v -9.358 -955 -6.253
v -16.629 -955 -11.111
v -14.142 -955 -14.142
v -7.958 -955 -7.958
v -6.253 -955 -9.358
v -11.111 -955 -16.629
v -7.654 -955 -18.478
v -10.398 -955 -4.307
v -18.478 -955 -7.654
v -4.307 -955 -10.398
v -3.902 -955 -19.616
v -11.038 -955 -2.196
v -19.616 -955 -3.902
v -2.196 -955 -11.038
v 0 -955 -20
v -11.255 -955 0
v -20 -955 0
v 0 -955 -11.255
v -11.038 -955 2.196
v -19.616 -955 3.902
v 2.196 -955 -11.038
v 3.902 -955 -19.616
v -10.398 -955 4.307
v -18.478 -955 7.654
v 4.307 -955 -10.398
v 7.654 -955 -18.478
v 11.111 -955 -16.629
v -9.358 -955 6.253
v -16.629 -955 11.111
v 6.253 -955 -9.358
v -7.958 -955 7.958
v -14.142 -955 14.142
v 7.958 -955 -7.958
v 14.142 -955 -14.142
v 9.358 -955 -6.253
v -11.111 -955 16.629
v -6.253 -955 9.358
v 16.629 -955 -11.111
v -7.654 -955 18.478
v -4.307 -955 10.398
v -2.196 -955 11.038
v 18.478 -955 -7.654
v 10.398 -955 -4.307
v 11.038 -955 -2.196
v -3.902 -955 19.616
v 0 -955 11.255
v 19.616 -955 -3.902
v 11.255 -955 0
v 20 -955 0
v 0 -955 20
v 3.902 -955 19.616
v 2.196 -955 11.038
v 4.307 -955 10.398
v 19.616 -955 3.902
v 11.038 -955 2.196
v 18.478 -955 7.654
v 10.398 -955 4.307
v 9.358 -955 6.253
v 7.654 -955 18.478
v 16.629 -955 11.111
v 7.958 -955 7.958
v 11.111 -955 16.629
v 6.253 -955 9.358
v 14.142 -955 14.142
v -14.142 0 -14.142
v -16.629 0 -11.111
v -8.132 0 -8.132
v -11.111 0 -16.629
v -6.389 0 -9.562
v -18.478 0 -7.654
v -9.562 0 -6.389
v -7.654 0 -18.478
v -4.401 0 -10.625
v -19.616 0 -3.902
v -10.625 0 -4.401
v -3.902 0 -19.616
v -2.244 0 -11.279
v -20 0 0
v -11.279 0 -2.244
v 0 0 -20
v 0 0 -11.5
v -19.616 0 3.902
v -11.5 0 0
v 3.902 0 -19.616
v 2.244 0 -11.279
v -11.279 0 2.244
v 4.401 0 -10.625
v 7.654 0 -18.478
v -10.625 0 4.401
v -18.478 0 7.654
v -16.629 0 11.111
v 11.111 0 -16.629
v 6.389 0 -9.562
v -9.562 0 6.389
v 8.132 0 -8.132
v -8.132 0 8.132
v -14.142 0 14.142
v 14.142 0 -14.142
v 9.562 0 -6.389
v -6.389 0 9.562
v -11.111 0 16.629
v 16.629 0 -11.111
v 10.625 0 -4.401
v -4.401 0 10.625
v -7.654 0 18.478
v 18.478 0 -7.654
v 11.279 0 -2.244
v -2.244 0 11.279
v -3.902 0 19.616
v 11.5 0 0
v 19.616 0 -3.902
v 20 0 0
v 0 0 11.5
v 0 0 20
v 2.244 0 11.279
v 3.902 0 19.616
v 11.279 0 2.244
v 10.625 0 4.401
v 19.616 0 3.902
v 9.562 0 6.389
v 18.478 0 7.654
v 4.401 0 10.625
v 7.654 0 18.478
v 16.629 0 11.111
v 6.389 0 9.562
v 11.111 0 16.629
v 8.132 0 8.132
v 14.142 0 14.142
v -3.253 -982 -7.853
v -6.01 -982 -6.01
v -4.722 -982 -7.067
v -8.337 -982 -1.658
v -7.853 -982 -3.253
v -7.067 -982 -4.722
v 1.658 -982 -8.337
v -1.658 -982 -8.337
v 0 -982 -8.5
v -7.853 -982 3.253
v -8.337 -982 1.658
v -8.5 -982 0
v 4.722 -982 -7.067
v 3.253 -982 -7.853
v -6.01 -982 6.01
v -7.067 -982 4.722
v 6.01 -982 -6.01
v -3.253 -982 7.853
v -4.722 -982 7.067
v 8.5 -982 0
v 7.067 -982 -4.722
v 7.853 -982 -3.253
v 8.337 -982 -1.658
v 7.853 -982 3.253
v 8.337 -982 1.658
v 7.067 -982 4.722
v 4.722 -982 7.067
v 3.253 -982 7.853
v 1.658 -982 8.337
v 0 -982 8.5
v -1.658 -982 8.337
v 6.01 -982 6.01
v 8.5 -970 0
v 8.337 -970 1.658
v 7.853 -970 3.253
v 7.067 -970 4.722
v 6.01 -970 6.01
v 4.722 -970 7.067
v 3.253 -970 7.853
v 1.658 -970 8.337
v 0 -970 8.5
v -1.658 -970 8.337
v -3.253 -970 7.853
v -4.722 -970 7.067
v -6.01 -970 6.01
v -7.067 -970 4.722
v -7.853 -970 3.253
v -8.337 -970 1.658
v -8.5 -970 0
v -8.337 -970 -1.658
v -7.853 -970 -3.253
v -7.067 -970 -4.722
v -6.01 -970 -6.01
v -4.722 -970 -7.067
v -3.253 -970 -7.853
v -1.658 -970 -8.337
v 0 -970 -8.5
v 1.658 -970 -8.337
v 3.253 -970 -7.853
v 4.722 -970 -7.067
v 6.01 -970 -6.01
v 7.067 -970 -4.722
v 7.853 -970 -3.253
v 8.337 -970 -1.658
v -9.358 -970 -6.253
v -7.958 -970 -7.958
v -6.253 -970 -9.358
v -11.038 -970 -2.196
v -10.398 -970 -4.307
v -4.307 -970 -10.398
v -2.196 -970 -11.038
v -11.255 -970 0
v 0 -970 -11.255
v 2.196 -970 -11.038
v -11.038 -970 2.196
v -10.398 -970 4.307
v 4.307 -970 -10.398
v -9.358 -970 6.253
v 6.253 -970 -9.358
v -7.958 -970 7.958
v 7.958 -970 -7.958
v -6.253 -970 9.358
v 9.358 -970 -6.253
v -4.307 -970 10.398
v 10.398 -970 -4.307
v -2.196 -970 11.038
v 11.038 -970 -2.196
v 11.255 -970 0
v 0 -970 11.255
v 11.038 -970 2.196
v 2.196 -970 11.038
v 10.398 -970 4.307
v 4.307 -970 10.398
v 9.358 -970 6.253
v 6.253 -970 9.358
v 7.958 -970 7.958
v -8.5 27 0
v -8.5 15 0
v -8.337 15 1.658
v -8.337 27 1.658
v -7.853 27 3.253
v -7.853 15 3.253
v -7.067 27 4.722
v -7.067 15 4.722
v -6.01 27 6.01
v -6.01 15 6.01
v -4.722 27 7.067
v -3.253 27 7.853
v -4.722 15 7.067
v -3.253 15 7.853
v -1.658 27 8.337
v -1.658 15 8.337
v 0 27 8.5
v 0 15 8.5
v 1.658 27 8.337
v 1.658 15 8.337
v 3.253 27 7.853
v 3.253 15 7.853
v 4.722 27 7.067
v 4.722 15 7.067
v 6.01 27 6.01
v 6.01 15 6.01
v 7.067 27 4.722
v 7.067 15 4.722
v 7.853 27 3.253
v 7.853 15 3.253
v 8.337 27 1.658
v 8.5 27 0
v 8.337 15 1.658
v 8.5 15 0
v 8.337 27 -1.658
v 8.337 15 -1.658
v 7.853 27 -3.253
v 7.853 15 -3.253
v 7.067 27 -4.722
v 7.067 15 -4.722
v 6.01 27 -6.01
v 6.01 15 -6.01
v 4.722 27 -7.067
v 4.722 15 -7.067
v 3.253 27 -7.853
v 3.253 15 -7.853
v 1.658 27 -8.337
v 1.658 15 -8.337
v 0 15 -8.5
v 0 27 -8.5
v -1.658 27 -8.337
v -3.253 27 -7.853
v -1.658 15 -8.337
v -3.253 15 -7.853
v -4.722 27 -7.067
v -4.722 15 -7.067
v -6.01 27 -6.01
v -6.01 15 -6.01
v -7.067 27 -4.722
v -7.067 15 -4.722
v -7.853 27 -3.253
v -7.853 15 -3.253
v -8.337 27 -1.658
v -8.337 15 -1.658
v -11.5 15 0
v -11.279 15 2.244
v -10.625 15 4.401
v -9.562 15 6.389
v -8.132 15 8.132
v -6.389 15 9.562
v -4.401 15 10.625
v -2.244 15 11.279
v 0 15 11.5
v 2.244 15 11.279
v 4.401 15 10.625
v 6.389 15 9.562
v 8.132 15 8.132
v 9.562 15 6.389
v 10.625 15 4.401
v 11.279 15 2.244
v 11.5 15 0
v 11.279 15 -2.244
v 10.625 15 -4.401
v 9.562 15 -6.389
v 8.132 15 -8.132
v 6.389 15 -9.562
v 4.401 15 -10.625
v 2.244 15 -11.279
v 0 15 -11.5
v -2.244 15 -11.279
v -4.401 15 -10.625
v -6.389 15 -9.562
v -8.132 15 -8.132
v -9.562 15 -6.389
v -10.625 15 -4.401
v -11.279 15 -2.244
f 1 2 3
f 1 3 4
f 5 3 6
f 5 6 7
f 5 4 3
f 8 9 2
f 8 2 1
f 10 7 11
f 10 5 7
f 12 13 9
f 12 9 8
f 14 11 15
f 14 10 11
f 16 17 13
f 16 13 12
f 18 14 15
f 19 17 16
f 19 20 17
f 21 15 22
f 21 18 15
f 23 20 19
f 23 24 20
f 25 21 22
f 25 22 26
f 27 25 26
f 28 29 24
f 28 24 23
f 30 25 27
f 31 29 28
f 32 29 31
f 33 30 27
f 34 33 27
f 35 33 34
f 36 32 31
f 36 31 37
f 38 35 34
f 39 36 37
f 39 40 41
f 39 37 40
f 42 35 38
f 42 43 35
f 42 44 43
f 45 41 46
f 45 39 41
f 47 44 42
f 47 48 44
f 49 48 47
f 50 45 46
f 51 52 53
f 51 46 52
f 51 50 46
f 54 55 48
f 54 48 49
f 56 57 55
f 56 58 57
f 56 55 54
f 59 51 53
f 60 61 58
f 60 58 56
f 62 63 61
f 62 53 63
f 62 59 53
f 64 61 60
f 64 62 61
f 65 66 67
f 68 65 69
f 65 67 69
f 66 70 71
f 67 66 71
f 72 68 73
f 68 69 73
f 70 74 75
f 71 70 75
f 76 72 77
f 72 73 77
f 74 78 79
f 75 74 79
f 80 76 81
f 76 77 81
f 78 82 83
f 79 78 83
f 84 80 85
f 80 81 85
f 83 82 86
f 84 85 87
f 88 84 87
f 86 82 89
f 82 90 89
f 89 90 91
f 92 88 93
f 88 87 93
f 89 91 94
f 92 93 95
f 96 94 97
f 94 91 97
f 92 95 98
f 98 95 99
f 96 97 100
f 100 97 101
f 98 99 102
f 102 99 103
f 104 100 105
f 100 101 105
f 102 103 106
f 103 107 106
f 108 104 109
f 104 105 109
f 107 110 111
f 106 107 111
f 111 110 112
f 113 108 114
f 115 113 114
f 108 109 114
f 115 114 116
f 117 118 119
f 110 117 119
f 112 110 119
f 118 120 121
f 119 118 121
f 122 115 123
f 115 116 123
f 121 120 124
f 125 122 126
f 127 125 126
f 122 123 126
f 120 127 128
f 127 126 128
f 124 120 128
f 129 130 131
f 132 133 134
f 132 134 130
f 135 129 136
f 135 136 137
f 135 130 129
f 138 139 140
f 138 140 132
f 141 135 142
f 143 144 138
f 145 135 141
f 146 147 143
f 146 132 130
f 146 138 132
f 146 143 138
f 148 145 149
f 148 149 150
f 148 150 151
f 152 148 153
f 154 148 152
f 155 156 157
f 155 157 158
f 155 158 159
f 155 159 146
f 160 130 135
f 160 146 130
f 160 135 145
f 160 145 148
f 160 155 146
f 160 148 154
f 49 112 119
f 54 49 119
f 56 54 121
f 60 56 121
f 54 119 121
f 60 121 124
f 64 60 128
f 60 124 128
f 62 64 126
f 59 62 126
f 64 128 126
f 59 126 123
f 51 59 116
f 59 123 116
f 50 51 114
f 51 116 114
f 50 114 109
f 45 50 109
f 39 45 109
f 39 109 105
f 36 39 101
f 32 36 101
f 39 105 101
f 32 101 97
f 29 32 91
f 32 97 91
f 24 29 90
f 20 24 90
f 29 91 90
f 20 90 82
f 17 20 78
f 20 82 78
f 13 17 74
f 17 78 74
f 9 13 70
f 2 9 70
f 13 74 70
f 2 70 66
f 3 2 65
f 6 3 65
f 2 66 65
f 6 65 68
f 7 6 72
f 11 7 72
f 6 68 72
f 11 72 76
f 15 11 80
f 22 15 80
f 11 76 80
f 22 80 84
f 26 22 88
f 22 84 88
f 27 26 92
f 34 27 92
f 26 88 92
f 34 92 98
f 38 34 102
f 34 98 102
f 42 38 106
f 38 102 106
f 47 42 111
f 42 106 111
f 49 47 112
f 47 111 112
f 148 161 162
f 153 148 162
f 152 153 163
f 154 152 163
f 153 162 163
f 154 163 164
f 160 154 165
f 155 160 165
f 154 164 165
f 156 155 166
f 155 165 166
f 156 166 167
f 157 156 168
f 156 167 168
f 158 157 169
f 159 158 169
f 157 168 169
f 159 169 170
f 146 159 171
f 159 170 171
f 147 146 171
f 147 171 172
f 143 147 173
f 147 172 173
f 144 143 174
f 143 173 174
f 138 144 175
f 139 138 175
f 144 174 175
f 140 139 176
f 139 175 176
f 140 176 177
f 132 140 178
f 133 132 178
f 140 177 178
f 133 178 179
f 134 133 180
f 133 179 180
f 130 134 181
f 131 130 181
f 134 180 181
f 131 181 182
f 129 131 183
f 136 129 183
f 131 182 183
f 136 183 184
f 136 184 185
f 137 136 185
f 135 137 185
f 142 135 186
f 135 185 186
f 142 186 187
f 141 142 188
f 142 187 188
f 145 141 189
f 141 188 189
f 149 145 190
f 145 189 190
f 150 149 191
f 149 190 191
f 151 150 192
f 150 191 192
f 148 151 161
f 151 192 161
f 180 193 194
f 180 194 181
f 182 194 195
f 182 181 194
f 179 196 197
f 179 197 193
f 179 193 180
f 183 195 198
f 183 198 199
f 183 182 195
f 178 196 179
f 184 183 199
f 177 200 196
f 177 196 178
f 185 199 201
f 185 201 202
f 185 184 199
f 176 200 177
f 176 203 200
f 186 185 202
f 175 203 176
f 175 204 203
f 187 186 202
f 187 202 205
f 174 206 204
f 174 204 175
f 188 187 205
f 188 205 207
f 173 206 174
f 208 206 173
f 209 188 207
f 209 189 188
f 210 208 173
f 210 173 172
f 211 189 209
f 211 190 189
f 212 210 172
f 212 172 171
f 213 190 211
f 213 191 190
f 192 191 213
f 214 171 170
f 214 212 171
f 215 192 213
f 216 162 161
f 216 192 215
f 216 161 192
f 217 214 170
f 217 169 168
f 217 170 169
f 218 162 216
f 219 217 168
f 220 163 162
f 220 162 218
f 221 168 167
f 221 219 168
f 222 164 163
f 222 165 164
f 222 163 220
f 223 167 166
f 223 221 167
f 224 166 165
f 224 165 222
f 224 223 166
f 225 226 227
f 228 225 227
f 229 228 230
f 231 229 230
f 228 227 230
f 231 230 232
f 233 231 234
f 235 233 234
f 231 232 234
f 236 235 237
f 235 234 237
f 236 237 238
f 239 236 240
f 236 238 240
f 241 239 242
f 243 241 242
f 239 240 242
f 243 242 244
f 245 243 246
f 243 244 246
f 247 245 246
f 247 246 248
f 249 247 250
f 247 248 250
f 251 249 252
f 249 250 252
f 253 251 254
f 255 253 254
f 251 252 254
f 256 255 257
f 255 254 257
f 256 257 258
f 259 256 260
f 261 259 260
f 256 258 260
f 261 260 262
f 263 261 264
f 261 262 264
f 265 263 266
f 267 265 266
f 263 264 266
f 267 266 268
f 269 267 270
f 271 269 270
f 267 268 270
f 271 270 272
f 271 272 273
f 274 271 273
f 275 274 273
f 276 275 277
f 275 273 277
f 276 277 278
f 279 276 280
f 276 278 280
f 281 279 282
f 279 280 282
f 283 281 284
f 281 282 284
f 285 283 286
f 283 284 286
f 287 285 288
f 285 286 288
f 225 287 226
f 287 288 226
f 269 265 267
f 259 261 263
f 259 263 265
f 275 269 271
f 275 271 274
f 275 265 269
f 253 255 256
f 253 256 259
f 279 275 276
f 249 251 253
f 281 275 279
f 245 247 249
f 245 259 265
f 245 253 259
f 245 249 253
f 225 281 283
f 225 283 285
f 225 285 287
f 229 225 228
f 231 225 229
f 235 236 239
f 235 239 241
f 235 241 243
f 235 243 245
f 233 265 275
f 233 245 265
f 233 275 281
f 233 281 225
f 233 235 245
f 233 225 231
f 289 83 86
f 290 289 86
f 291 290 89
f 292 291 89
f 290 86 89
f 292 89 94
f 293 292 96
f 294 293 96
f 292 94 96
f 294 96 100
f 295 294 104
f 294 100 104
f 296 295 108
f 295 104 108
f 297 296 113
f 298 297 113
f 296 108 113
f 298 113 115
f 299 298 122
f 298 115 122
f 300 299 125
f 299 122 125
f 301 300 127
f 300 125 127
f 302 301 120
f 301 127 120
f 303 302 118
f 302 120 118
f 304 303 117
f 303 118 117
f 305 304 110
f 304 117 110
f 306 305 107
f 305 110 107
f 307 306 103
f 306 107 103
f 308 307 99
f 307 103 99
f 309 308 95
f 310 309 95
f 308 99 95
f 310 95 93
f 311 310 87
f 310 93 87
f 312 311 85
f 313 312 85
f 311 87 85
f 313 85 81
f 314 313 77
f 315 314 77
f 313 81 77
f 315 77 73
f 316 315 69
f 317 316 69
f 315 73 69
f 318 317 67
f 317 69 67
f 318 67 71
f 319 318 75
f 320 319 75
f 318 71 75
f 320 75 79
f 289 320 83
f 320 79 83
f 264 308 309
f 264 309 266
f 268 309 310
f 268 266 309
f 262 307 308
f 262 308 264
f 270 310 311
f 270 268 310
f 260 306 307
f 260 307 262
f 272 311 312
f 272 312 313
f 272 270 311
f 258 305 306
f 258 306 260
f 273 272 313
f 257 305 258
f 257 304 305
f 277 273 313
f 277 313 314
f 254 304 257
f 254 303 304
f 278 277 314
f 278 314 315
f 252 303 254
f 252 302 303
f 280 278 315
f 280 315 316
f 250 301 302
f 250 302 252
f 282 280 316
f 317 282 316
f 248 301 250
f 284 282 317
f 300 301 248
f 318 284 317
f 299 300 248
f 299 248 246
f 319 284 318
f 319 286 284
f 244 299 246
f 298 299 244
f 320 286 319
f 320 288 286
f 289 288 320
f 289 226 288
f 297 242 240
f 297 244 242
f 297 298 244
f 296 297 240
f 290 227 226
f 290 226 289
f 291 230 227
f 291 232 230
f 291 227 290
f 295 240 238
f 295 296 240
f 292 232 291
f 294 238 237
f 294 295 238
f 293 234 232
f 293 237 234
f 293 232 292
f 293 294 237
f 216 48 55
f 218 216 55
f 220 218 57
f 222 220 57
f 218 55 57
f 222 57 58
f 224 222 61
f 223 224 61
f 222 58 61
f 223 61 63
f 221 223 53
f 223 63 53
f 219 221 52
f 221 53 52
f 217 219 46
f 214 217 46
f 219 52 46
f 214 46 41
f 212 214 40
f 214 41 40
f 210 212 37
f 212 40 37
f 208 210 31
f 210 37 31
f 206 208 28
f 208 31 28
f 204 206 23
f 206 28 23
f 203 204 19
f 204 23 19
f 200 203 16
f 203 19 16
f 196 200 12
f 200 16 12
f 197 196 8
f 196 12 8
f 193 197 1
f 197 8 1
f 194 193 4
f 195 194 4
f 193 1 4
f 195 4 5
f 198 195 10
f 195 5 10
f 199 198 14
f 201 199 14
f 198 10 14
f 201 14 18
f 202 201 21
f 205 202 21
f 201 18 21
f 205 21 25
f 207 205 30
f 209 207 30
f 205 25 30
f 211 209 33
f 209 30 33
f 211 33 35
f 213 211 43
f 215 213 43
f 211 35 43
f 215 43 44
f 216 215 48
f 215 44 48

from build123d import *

# Parameters (mm, degrees)
F0_R     = 20
F1_DEPTH = 955
F2_R     = 11.254602
F3_DEPTH = 15
F4_R     = 11.5
F5_DEPTH = 15
F6_R     = 8.5
F7_DEPTH = 12
F8_R     = 8.5
F9_DEPTH = 12


with BuildPart() as f1:
    # F0 (on Front) → F1 (new body)
    with BuildSketch(Plane.XZ):
        Circle(F0_R)
    extrude(amount=F1_DEPTH)

    # F2 (on face) → F3 (join)
    with BuildSketch(Plane.XZ.offset(955)):
        Circle(F2_R)
    extrude(amount=F3_DEPTH)

    # F4 (on face) → F5 (join)
    with BuildSketch(Plane(origin=(0, 0, 0), x_dir=(-1, 0, 0), z_dir=(0, 1, 0))):
        Circle(F4_R)
    extrude(amount=F5_DEPTH)

    # F6 (on face) → F7 (join)
    with BuildSketch(Plane.XZ.offset(970)):
        Circle(F6_R)
    extrude(amount=F7_DEPTH)

    # F8 (on face) → F9 (join)
    with BuildSketch(Plane(origin=(0, 15, 0), x_dir=(-1, 0, 0), z_dir=(0, 1, 0))):
        Circle(F8_R)
    extrude(amount=F9_DEPTH)


solid = f1.part
